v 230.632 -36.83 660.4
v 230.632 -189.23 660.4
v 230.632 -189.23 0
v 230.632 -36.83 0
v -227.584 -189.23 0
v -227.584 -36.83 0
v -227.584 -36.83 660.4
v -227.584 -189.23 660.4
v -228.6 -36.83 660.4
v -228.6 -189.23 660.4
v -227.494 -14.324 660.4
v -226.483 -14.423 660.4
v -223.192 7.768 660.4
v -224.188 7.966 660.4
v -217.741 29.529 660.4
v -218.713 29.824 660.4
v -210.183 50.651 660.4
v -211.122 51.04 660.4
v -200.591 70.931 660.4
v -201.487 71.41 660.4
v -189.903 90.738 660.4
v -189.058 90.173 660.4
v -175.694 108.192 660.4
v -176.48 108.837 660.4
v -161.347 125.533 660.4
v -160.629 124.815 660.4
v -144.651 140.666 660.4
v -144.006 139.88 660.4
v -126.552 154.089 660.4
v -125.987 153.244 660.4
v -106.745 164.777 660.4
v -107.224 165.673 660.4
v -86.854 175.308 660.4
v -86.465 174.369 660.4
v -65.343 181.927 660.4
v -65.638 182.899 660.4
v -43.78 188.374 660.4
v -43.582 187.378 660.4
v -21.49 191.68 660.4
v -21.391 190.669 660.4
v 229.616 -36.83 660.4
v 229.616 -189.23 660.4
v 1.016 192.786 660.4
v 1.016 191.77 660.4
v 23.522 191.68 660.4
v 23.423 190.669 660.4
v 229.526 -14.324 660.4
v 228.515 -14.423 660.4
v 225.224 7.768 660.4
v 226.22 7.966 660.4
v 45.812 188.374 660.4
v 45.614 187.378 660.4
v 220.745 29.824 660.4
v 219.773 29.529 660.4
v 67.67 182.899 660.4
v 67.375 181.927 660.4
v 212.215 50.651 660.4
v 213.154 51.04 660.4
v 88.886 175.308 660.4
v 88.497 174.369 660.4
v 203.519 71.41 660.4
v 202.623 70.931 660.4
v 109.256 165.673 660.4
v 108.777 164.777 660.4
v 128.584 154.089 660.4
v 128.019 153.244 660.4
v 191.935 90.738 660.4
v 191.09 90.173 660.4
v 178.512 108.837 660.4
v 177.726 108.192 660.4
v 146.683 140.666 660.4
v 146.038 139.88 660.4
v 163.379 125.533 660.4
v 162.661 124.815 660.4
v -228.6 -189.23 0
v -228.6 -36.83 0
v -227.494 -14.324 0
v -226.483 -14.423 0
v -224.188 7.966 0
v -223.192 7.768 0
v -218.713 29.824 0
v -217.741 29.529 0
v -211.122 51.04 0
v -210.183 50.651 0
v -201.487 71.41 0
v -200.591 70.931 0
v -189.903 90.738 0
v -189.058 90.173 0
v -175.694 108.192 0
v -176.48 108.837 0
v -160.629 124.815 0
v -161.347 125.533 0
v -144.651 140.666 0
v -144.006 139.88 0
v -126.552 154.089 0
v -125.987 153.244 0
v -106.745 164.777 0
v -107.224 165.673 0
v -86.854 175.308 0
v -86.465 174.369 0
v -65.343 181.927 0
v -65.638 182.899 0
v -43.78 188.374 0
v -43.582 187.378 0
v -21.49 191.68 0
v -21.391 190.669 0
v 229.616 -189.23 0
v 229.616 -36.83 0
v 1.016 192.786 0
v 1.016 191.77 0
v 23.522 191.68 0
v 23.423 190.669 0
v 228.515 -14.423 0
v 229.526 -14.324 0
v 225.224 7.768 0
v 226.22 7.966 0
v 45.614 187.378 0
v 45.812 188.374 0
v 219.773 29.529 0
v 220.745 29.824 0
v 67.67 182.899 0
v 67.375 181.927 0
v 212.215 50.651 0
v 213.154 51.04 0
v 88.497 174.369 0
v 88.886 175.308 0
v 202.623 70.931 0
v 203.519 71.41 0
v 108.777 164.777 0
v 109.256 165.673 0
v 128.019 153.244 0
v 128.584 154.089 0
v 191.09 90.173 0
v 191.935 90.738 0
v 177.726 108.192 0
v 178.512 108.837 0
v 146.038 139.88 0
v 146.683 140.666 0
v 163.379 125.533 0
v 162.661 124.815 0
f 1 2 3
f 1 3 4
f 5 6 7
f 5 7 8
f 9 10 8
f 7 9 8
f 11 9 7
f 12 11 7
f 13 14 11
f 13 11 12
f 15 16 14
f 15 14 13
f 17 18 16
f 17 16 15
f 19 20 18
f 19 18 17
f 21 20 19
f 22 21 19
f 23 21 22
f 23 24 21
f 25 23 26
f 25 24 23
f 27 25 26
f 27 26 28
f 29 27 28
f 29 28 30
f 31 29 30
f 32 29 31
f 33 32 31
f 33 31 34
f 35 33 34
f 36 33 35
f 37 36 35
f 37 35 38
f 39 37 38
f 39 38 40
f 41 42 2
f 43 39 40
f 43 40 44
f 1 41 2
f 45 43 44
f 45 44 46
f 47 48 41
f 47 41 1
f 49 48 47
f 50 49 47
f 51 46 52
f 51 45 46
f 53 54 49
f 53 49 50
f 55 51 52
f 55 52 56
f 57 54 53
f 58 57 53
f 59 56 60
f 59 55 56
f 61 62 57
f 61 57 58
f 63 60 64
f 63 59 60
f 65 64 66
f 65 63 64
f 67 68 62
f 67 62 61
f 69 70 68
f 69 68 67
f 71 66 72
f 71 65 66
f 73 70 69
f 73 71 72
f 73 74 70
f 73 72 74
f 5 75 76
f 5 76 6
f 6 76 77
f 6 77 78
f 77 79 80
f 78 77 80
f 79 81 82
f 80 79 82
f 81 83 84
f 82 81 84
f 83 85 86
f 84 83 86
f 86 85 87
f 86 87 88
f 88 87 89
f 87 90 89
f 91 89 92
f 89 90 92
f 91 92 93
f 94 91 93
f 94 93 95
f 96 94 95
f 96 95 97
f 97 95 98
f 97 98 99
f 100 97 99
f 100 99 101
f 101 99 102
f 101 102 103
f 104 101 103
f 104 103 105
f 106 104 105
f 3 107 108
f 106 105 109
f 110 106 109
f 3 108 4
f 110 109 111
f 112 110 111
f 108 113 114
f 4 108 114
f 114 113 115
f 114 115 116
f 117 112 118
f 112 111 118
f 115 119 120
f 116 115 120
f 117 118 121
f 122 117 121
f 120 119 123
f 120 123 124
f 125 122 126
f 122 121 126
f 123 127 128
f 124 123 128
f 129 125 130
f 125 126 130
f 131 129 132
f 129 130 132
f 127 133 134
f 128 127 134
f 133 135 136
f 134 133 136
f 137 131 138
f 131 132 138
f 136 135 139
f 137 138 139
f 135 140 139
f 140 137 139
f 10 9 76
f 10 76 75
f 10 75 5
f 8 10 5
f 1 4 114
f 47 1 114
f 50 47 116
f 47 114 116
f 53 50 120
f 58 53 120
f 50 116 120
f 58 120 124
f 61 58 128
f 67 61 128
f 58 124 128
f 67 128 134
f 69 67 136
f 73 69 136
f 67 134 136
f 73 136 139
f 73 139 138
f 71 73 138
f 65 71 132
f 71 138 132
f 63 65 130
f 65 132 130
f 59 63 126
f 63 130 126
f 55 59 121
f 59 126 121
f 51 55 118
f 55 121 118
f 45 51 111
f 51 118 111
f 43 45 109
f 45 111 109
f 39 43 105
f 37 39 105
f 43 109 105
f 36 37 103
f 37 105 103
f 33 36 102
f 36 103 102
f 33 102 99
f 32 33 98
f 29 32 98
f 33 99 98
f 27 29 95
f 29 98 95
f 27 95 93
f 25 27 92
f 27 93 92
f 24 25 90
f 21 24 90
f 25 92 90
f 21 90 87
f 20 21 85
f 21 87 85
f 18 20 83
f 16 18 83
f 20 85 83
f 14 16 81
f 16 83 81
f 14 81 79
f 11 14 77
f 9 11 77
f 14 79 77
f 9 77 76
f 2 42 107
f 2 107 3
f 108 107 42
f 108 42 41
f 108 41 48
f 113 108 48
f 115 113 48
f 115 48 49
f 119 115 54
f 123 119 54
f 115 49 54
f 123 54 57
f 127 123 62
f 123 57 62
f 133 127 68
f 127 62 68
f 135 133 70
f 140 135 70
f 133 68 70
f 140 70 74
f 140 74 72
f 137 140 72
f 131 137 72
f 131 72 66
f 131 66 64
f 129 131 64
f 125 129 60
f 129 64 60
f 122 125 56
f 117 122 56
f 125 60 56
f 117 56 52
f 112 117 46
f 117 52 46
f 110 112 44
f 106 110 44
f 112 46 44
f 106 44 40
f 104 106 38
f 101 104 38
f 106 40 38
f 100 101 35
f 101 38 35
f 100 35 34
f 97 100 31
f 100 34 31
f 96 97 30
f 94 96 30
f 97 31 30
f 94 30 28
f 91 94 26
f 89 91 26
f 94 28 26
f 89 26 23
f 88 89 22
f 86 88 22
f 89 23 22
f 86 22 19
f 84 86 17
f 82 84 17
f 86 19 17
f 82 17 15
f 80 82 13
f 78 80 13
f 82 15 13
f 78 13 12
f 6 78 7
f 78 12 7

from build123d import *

# Parameters (mm, degrees)
BOSS_EXTRUDE1_DEPTH = 660.4
CUT_EXTRUDE1_DEPTH  = 660.4


with BuildPart() as part:
    # Sketch1 → Boss-Extrude1 (new body)
    with BuildSketch(Plane.XY):
        with BuildLine():
            Line((-228.6, -36.83), (-228.6, -189.23))
            Line((-228.6, -189.23), (230.632, -189.23))
            Line((230.632, -189.23), (230.632, -36.83))
            ThreePointArc((230.632, -36.83), (1.016, 192.786), (-228.6, -36.83))
        make_face()
    extrude(amount=BOSS_EXTRUDE1_DEPTH)

    # Sketch2 → Cut-Extrude1 (cut)
    with BuildSketch(Plane.XY.offset(660.4)):
        with BuildLine():
            Line((-227.584, -36.83), (-227.584, -189.23))
            Line((-227.584, -189.23), (229.616, -189.23))
            Line((229.616, -189.23), (229.616, -36.83))
            ThreePointArc((229.616, -36.83), (1.016, 191.77), (-227.584, -36.83))
        make_face()
    extrude(amount=-CUT_EXTRUDE1_DEPTH, mode=Mode.SUBTRACT)


solid = part.part
